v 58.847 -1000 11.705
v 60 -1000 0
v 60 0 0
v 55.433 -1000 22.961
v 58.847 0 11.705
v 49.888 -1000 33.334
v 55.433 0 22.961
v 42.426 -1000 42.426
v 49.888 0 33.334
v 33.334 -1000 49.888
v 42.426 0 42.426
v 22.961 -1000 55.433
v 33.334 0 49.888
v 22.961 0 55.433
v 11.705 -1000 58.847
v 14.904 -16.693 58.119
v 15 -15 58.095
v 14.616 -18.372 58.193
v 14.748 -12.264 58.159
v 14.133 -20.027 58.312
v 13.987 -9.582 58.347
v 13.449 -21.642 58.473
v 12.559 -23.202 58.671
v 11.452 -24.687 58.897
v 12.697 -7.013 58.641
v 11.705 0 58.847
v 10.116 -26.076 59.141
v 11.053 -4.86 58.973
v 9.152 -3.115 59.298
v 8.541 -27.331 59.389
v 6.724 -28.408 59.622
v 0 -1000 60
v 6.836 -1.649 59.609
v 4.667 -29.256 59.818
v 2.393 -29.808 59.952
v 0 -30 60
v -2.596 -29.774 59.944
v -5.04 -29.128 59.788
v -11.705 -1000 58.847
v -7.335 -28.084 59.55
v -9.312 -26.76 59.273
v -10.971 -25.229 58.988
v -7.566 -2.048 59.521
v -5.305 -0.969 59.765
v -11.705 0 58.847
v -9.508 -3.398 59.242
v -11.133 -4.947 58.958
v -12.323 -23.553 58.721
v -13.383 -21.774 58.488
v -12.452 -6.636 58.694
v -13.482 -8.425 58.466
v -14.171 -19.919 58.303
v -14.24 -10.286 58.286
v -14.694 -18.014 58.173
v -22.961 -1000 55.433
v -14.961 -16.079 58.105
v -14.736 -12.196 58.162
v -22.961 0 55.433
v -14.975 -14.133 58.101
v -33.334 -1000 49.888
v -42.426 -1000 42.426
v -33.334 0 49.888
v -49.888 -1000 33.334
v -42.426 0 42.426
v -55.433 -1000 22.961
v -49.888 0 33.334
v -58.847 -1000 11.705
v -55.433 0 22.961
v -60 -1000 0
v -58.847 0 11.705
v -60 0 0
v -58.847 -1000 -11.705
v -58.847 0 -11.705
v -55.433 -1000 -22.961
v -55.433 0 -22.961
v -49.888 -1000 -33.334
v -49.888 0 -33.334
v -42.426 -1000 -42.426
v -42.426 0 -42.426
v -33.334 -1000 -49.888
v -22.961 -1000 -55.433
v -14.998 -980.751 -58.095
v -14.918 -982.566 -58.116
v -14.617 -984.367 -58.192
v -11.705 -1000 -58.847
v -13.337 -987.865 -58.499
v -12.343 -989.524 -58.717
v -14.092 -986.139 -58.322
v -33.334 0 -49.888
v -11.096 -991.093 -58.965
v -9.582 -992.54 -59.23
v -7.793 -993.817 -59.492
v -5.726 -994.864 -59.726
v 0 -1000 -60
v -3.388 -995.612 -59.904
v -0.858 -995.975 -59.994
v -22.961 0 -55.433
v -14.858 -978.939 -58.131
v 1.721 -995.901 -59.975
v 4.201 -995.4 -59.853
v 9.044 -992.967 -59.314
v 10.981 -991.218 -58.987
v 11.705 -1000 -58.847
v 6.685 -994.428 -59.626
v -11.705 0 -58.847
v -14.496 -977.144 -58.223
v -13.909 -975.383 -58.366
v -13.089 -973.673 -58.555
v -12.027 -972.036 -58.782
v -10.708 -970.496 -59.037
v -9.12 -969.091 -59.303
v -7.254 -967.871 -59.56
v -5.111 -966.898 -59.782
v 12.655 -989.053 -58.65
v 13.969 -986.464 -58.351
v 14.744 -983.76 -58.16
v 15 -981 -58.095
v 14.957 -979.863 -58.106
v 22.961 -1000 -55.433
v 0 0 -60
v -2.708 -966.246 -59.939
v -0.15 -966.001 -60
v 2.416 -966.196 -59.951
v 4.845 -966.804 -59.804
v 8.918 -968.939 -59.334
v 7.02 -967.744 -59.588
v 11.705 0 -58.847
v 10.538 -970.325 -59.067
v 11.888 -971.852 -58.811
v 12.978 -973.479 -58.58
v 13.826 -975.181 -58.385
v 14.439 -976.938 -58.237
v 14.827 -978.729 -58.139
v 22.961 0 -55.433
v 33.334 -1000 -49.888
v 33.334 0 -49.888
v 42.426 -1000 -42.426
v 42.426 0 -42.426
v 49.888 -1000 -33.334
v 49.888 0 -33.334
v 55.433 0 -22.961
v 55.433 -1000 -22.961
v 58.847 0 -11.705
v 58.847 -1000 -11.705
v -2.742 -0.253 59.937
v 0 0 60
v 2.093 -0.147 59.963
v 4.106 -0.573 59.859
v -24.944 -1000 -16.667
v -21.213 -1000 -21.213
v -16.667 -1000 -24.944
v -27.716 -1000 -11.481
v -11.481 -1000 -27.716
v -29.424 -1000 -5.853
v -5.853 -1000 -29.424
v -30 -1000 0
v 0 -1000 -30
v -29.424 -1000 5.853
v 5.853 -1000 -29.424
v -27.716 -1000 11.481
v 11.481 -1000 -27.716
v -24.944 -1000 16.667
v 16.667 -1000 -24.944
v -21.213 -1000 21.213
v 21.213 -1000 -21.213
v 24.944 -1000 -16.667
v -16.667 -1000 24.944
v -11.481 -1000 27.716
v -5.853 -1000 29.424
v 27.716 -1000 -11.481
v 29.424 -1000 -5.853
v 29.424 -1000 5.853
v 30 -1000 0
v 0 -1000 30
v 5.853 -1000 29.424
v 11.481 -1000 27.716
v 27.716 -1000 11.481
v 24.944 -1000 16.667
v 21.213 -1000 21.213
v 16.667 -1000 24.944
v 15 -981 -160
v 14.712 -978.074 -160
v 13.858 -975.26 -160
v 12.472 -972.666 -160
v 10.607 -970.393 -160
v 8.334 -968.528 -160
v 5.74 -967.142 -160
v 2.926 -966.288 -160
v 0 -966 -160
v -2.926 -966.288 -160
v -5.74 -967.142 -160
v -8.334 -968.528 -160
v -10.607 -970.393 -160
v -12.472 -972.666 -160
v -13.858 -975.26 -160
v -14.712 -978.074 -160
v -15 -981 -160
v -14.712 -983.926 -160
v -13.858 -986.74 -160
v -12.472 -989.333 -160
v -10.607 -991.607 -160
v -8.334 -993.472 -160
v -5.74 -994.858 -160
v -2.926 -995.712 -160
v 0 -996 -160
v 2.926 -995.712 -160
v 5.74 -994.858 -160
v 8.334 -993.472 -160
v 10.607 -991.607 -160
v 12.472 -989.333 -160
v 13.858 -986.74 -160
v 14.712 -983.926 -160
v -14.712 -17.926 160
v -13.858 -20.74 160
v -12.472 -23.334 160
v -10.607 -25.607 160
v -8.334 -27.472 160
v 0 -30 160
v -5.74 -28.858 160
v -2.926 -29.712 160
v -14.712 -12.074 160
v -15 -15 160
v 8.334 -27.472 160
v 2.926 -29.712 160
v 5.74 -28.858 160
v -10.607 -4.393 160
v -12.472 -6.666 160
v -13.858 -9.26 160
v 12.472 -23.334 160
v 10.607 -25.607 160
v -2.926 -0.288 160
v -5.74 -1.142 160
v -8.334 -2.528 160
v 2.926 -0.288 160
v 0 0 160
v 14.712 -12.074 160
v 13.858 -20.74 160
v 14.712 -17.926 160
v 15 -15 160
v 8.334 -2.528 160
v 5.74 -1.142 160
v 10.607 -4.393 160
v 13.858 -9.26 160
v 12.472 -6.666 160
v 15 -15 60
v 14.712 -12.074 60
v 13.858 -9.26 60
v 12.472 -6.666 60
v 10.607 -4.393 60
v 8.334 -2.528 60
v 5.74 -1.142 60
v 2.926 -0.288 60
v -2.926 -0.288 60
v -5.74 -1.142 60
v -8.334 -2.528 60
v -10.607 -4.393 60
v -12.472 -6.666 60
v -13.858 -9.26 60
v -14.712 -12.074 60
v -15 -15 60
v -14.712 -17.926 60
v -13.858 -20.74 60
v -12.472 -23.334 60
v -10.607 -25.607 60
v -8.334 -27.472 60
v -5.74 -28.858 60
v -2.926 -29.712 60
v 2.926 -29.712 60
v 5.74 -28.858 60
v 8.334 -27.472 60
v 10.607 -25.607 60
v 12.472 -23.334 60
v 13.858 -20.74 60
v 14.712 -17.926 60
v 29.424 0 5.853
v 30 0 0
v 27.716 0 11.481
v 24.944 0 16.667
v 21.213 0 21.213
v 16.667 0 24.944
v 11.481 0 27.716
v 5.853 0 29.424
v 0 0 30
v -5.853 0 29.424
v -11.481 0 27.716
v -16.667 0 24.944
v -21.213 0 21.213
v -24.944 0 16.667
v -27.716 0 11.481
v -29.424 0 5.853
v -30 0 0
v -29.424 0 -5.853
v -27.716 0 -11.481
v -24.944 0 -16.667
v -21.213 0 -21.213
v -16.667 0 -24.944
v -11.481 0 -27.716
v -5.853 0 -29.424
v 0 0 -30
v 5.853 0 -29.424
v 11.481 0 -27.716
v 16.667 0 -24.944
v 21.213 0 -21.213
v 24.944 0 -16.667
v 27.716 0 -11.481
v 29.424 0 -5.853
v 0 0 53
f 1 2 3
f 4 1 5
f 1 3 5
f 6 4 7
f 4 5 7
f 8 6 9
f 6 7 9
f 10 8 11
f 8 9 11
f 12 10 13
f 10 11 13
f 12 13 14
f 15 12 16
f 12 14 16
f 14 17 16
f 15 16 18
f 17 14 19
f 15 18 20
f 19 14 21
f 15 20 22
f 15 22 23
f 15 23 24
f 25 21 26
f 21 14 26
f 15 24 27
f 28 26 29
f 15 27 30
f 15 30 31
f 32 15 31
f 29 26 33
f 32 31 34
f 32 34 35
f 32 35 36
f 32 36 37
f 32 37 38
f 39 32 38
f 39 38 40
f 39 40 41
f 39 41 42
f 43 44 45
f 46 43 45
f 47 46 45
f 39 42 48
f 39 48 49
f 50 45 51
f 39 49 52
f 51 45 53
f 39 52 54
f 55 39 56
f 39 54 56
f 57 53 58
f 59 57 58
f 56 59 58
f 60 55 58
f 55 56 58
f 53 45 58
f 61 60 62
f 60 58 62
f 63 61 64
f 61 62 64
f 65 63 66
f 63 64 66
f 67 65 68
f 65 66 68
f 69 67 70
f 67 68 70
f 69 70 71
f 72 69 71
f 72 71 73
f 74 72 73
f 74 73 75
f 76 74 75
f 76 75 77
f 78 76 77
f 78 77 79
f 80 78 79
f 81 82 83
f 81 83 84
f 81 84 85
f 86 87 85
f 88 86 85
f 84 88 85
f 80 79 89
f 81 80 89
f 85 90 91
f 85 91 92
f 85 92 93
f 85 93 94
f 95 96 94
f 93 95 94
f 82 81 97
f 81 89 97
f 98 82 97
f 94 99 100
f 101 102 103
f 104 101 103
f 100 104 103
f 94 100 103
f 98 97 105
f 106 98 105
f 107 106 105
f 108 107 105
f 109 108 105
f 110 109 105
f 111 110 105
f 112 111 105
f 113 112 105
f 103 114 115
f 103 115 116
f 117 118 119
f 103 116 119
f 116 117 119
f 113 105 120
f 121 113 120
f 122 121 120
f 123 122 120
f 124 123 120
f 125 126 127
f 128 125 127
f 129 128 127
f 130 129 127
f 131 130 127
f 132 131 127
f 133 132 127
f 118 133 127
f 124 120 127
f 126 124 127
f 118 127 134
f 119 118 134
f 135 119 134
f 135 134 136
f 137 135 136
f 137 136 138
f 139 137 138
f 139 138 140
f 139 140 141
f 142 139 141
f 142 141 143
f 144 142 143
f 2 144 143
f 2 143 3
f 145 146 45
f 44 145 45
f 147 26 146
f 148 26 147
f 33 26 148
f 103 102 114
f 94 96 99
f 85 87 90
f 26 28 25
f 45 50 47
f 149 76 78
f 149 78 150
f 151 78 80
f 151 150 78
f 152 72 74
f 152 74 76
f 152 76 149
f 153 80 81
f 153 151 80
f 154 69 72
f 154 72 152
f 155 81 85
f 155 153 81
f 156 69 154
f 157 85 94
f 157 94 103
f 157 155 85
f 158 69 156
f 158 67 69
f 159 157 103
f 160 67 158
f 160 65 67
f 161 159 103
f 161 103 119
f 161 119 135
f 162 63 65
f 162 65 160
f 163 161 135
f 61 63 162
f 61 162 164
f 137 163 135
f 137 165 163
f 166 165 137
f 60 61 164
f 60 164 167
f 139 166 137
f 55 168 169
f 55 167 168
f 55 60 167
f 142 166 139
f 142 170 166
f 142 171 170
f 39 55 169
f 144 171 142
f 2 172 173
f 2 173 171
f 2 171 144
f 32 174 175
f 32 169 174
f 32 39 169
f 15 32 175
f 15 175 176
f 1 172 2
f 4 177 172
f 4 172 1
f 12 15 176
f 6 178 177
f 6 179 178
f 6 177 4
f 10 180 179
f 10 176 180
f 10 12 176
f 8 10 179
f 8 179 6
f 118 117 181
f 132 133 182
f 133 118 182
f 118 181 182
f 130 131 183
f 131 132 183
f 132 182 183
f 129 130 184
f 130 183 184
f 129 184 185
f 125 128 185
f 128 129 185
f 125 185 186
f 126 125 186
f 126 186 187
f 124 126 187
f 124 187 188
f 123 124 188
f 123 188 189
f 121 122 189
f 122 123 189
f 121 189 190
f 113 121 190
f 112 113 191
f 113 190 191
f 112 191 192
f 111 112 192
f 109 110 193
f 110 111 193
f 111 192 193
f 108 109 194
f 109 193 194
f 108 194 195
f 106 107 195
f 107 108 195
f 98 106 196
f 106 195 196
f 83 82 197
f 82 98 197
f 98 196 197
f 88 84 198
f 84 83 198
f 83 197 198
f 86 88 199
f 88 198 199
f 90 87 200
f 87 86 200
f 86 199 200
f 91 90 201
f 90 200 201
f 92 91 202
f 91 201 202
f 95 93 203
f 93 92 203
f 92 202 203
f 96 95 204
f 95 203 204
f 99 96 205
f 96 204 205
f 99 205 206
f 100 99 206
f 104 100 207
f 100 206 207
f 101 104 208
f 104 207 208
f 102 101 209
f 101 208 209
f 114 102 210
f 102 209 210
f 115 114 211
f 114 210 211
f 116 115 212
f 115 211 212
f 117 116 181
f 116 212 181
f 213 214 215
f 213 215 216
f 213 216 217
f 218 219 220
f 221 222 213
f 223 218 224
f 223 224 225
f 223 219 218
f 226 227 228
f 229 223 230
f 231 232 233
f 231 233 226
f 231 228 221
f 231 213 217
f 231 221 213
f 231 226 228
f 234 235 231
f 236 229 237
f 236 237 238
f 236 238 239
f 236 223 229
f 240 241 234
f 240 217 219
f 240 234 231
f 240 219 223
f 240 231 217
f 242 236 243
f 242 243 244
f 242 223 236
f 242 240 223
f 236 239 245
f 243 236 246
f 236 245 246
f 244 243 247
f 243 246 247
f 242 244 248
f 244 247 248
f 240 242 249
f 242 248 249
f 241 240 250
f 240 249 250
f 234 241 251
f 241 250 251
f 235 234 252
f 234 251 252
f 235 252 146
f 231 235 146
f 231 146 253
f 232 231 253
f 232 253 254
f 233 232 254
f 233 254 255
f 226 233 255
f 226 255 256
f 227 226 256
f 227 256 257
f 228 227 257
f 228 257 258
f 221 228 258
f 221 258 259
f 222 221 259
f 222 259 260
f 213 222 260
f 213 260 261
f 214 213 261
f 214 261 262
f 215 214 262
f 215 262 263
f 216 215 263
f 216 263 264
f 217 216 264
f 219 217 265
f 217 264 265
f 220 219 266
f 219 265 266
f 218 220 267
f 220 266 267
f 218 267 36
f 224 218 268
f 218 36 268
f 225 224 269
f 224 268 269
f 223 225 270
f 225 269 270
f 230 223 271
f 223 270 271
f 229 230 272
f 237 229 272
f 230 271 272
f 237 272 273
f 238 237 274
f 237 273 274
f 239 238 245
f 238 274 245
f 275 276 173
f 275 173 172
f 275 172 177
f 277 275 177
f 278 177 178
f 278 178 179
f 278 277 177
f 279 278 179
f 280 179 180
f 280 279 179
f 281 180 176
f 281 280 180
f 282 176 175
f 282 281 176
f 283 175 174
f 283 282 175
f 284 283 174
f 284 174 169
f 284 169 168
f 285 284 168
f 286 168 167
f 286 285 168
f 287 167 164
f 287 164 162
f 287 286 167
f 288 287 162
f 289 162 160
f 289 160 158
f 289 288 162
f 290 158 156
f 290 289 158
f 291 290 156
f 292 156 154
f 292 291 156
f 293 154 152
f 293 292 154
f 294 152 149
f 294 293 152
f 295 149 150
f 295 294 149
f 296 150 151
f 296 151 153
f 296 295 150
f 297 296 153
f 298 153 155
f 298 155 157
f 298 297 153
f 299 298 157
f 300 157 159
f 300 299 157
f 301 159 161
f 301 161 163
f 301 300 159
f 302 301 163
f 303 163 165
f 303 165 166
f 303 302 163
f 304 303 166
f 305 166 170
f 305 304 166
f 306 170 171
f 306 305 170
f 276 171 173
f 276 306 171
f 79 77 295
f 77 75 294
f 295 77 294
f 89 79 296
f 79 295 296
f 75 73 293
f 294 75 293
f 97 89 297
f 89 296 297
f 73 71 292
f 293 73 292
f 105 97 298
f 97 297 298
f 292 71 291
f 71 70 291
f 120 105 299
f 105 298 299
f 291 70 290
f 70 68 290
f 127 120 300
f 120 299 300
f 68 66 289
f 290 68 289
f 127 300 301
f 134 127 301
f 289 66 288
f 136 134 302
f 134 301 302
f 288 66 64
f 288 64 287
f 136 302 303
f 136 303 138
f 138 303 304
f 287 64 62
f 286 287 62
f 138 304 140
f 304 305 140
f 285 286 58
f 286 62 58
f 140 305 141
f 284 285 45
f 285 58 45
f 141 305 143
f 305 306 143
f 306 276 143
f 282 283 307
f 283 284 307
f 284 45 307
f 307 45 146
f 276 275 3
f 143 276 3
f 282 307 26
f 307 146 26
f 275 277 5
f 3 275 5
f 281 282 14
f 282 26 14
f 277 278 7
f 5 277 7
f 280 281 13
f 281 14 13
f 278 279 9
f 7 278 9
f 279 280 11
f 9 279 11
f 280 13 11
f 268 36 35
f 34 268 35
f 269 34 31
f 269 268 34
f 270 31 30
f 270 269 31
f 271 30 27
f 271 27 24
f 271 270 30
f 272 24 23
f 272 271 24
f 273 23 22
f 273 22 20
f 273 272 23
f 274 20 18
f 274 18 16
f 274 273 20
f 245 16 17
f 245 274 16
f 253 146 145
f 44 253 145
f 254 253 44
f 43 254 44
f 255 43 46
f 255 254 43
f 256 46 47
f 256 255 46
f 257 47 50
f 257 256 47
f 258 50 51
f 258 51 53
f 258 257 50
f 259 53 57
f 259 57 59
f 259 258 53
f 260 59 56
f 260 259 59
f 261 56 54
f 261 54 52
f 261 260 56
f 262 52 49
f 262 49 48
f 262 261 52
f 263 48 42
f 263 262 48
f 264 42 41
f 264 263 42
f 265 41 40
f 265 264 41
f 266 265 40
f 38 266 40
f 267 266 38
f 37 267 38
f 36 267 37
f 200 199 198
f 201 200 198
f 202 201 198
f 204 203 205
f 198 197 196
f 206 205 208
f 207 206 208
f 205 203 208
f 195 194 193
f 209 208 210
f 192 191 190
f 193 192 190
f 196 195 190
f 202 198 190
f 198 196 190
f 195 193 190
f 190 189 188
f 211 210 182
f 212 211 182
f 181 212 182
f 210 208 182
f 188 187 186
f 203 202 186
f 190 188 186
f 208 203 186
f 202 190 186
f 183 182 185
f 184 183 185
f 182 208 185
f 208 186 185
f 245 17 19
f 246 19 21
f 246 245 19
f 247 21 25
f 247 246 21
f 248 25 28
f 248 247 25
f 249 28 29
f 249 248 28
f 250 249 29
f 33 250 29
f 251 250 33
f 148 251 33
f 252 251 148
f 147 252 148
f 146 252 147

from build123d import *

# Parameters (mm, degrees)
F0_R          = 60
F0_R_2        = 30
F1_DEPTH      = 1000
F3_R          = 15
F4_DEPTH      = 100
F4_DEPTH_BACK = 7
F6_R          = 15
F7_DEPTH      = 100
F7_DEPTH_BACK = 7


with BuildPart() as f1:
    # F0 (on Front) → F1 (new body)
    with BuildSketch(Plane.XZ):
        Circle(F0_R)
        Circle(F0_R_2, mode=Mode.SUBTRACT)
    extrude(amount=F1_DEPTH)

    # F3 (on offset) → F4 (join, two sides)
    with BuildSketch(Plane.XY.offset(60)) as f4_sk:
        with Locations((0, -15)):
            Circle(F3_R)
    extrude(amount=F4_DEPTH)
    extrude(f4_sk.sketch, amount=-F4_DEPTH_BACK)

    # F6 (on offset) → F7 (join, two sides)
    with BuildSketch(Plane.XY.offset(-60)) as f7_sk:
        with Locations((0, -980.9999256134)):
            Circle(F6_R)
    extrude(amount=-F7_DEPTH)
    extrude(f7_sk.sketch, amount=F7_DEPTH_BACK)


solid = f1.part
